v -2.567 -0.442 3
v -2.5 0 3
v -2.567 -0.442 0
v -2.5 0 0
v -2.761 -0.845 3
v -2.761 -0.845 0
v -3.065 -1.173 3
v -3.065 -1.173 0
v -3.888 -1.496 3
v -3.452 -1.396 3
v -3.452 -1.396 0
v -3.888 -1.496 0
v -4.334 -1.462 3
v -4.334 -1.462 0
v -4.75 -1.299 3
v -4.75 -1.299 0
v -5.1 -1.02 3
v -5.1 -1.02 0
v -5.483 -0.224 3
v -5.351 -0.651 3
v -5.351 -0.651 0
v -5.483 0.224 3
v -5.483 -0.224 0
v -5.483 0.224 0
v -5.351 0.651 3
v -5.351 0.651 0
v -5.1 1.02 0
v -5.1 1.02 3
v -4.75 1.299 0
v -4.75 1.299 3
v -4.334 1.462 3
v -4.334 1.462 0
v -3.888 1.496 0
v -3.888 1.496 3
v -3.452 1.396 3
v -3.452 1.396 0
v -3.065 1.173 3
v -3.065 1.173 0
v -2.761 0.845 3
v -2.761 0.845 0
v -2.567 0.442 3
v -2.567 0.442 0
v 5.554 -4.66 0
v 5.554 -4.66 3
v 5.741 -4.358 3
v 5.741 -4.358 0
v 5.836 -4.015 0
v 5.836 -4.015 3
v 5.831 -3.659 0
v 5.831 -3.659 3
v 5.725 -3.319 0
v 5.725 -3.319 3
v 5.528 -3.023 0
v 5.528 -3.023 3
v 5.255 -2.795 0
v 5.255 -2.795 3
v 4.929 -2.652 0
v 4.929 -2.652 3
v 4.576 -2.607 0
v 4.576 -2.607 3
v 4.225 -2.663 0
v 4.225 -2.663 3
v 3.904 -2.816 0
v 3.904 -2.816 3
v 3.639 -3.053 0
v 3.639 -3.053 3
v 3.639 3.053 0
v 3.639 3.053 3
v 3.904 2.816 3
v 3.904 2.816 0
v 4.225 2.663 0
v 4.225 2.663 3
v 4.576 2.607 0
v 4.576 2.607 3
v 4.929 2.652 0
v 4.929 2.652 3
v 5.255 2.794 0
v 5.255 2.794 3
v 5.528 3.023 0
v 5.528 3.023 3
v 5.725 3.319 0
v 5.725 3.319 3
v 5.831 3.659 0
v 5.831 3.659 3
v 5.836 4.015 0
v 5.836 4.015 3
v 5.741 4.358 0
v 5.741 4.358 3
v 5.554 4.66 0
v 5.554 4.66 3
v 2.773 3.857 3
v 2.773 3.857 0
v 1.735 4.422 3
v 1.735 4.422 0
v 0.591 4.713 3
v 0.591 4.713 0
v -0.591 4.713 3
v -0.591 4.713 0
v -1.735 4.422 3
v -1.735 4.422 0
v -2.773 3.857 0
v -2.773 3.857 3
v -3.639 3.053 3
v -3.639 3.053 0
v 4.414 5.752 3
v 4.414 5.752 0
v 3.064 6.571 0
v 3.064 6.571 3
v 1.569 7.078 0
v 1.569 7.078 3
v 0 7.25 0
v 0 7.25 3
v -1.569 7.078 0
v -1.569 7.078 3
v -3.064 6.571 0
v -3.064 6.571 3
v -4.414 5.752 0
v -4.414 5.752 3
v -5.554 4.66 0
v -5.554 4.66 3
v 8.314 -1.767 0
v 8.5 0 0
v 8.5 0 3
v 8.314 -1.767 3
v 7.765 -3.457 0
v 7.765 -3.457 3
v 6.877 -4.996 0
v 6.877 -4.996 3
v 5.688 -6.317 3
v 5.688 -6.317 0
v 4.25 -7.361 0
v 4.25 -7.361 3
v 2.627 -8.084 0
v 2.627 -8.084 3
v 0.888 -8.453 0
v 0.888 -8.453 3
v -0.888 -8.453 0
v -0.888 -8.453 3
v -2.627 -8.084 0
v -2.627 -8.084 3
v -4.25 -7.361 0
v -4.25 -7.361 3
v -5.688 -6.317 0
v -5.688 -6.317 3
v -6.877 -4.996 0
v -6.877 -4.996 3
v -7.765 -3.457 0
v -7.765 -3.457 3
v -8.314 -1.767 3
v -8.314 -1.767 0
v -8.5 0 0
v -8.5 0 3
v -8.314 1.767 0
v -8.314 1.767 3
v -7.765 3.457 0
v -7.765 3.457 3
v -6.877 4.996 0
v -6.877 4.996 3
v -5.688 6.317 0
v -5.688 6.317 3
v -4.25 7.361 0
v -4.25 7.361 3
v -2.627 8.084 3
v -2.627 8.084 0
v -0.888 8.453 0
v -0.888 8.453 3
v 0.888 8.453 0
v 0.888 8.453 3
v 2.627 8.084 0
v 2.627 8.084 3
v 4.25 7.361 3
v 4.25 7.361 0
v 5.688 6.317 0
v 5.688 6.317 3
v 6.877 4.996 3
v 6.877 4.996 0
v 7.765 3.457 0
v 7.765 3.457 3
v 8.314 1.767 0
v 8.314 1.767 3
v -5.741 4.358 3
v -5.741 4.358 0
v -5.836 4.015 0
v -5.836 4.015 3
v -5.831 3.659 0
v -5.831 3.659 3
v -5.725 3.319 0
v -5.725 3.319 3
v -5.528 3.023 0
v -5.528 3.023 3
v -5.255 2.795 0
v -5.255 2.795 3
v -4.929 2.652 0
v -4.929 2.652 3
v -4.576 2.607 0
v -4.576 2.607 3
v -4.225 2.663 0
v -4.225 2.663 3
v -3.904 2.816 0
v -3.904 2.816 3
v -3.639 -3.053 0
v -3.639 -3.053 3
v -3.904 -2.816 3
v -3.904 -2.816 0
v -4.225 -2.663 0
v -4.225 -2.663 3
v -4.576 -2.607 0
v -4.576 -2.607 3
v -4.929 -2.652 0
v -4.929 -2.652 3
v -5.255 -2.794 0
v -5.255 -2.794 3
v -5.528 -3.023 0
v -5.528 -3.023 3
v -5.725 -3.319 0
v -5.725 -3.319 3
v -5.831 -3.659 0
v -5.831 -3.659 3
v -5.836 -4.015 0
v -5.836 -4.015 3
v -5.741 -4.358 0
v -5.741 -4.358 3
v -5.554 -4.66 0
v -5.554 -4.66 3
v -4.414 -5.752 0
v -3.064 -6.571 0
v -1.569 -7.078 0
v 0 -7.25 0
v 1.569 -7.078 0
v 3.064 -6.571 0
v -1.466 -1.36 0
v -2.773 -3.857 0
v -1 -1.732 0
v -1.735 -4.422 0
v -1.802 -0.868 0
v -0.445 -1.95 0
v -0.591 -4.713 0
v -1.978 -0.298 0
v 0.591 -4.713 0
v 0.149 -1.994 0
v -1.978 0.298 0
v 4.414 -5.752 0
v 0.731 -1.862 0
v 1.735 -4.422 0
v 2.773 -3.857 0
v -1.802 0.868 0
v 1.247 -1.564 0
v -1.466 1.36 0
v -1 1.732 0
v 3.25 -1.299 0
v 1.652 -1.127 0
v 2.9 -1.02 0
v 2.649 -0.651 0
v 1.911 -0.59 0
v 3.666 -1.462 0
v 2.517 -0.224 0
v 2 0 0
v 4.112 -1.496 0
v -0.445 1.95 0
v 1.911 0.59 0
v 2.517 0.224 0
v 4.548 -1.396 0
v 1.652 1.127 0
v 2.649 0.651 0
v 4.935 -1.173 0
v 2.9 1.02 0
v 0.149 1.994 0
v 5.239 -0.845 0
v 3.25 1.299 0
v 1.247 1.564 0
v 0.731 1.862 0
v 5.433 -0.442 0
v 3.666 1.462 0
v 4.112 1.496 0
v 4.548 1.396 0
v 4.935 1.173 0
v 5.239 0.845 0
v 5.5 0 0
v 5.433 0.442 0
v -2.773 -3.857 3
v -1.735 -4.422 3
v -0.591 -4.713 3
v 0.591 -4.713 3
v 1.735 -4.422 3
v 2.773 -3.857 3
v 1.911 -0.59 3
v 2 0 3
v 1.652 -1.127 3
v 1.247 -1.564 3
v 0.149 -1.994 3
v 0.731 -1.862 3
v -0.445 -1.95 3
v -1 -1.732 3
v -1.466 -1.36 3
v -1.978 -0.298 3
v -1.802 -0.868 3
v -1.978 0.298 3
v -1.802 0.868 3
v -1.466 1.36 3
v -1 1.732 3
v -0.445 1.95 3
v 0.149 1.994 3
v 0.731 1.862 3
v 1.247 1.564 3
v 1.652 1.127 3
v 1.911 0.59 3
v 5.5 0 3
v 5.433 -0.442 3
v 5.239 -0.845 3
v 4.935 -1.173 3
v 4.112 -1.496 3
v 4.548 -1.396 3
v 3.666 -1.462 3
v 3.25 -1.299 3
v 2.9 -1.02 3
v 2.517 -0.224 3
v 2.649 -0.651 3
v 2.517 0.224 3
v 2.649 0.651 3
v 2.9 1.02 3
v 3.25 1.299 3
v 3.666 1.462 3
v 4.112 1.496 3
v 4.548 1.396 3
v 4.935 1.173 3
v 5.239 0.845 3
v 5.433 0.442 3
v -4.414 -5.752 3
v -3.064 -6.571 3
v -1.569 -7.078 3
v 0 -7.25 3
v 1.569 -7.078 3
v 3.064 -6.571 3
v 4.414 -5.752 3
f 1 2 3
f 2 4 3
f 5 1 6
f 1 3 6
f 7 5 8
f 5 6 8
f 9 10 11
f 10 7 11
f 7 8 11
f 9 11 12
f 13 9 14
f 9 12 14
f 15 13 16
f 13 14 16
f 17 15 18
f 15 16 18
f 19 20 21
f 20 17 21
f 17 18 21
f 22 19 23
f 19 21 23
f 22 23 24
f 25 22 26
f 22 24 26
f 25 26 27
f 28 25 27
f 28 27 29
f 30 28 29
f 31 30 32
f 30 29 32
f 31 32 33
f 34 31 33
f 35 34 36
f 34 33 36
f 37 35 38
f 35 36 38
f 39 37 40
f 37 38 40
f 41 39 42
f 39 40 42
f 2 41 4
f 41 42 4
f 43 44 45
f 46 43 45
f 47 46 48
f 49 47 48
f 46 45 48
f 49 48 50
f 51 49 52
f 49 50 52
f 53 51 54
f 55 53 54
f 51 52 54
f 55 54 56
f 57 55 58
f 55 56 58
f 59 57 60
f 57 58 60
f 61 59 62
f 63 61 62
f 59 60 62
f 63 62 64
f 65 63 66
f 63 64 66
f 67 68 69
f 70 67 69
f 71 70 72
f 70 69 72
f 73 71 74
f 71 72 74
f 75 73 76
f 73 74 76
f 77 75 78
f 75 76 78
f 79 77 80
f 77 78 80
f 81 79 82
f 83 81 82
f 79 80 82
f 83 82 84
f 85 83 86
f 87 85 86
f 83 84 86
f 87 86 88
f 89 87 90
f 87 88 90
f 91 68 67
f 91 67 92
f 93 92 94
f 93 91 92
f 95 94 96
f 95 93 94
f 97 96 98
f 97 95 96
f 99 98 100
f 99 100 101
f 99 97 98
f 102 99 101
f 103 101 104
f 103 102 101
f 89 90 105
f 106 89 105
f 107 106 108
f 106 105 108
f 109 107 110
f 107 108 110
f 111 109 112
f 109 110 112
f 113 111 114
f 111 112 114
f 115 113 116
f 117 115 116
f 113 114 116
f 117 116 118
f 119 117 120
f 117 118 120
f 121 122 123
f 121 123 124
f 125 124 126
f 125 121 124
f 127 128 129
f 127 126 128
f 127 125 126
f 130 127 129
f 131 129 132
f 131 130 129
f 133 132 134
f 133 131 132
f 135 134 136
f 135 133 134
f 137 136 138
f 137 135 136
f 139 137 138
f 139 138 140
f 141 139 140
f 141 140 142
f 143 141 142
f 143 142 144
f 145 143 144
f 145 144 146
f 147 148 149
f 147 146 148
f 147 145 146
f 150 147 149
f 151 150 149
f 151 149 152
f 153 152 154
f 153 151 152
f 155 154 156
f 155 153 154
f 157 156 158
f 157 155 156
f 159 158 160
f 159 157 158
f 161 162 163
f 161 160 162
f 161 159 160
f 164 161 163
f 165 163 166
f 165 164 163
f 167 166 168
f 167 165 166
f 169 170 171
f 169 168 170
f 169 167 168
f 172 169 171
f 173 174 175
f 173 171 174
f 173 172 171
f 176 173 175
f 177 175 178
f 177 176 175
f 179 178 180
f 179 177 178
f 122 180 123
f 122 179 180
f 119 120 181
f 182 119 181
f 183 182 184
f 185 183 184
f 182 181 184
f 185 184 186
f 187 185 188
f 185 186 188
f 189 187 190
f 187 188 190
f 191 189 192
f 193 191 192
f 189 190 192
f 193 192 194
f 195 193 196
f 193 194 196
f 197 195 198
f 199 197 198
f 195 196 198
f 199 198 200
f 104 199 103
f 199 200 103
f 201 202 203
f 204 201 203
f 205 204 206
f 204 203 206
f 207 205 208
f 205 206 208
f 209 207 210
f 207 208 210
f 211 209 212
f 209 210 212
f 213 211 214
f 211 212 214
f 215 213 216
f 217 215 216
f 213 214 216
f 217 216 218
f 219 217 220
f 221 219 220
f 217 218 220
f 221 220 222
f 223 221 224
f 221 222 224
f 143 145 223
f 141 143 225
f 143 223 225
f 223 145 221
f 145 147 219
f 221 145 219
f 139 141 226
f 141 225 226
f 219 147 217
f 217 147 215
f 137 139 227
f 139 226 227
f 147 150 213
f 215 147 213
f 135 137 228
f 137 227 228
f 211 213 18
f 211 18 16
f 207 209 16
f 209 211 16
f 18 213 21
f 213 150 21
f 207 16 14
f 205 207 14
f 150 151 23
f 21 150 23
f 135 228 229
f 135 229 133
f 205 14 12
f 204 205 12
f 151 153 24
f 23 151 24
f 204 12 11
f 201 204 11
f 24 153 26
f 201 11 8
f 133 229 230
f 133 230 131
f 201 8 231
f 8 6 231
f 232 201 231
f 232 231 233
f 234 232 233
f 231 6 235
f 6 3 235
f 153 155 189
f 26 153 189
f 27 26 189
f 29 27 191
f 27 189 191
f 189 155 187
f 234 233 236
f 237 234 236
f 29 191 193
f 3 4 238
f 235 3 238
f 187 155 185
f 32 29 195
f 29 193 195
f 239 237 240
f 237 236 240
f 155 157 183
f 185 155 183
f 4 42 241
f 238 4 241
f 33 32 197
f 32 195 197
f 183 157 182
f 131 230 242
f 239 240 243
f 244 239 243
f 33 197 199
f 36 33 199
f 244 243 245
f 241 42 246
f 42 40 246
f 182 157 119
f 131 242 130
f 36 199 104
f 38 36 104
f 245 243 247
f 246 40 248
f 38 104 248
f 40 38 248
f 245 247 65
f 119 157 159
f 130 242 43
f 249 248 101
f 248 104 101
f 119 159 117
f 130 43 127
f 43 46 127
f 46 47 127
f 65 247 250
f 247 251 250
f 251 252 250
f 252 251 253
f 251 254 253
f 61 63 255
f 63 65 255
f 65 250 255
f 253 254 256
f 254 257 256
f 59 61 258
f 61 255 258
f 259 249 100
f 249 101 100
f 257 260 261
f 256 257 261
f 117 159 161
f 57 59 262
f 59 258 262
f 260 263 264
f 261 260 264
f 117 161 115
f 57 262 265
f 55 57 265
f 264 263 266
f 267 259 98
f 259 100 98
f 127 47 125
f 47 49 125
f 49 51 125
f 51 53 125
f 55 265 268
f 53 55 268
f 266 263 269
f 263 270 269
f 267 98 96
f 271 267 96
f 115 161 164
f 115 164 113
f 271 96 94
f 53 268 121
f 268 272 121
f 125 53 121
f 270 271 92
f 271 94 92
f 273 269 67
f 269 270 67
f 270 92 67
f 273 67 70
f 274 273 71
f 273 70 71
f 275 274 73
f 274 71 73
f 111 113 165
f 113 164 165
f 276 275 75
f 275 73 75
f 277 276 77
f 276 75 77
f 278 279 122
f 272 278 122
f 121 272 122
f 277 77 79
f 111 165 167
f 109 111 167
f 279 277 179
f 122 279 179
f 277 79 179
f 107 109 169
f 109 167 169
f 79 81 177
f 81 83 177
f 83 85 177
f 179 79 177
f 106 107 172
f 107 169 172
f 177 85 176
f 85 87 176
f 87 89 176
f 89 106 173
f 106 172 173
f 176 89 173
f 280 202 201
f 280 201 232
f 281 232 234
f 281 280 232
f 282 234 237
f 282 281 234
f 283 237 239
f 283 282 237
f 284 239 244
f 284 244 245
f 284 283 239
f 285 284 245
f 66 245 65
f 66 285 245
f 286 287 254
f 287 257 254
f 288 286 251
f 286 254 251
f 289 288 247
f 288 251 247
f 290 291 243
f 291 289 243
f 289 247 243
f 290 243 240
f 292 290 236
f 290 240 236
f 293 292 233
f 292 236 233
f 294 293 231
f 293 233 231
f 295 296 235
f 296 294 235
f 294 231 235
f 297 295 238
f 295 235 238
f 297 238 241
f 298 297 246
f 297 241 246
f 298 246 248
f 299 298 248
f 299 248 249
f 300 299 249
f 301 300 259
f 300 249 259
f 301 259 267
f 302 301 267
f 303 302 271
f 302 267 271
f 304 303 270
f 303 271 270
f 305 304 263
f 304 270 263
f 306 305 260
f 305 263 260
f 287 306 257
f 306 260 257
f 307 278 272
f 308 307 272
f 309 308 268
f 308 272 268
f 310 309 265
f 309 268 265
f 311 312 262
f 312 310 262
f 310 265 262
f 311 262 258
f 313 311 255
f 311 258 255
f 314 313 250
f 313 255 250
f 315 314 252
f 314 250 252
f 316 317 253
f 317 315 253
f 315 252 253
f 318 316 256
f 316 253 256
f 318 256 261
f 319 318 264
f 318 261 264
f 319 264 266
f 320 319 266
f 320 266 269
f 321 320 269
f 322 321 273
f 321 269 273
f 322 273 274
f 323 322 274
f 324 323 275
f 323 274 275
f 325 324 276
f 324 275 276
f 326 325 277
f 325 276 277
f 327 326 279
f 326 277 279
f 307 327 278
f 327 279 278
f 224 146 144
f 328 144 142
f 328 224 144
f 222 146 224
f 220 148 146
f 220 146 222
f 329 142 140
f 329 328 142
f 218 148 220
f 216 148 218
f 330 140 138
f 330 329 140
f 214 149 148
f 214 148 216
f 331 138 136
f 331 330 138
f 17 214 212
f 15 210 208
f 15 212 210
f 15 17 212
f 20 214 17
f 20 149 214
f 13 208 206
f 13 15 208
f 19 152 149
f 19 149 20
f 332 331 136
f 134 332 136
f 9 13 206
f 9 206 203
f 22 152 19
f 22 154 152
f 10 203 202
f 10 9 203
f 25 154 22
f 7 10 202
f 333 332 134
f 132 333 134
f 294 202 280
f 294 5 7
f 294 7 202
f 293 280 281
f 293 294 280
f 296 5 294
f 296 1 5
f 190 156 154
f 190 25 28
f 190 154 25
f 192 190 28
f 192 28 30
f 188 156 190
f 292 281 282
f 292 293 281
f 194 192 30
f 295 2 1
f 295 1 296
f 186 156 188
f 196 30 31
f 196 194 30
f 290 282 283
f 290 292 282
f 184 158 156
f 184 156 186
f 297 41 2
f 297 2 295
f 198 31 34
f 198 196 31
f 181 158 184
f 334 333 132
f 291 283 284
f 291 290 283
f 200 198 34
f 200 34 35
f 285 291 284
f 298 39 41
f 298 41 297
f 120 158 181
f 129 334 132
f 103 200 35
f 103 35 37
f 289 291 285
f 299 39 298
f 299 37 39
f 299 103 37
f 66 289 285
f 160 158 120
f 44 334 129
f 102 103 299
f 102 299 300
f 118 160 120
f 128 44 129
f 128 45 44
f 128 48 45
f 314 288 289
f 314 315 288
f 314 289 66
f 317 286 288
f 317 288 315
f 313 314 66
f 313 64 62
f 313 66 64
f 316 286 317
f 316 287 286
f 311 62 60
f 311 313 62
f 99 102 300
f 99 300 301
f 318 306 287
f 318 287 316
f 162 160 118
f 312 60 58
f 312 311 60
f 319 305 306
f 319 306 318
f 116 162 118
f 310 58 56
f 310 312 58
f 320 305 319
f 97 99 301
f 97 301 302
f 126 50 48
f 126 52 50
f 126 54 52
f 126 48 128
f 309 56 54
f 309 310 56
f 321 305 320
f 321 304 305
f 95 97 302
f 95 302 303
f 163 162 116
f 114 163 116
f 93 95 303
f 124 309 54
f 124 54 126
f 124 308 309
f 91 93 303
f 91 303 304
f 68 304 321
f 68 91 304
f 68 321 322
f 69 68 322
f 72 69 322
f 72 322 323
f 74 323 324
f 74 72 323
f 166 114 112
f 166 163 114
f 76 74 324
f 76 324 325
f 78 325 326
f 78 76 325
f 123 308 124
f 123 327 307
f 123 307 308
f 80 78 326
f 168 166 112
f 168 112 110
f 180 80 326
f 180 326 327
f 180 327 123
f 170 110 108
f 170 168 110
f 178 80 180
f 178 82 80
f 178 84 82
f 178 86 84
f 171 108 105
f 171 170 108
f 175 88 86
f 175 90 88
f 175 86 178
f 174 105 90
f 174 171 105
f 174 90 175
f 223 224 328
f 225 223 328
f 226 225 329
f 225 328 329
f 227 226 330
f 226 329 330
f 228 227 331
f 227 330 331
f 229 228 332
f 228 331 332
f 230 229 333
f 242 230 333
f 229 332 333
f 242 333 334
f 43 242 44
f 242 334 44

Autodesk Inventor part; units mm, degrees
ref_plane "YZ Plane" through (0, 0, 0) normal (1, 0, 0) x (0, 1, 0)
ref_plane "XZ Plane" through (0, 0, 0) normal (0, 1, 0) x (-1, 0, 0)
ref_plane "XY Plane" through (0, 0, 0) normal (0, 0, 1) x (1, 0, 0)
sketch "スケッチ1" plane through (0, 0, 0) normal (0, 0, 1) x (1, 0, 0)
  line L0 (0, 0) -> (-4, 0) construction
  circle A0 centre (-4, 0) radius 1.5
  line L1 (0, 0) -> (4, 0) construction
  circle A1 centre (4, 0) radius 1.5
  line L2 (0, 0) -> (0, 4.3) construction
  line L3 (0, 0) -> (-8.8388, 8.8388) construction
  circle A2 centre (-8.8388, 8.8388) radius 1.5
  line L4 (0, 0) -> (-8.8388, -8.8388) construction
  circle A3 centre (-8.8388, -8.8388) radius 1.5
  line L5 (0, 0) -> (8.8388, -8.8388) construction
  circle A4 centre (8.8388, -8.8388) radius 1.5
  line L6 (0, 0) -> (8.8388, 8.8388) construction
  circle A5 centre (8.8388, 8.8388) radius 1.5
  circle A6 centre (0, 0) radius 8.5
  circle A7 centre (0, 0) radius 15.5
  circle A8 centre (0, 0) radius 2
  dimension "d0" = 4
  dimension "d1" = 3
  dimension "d4" = 360
  dimension "d6" = 12.5
  dimension "d7" = 3
  dimension "d8" = 45
  dimension "d11" = 360
  dimension "d14" = 17
  dimension "d15" = 1.5
  dimension "d16" = 4
extrude "押し出し1" add sketch "スケッチ1" along normal blind 3 contours A6
sketch "スケッチ4" plane through (0, 0, 3) normal (0, 0, 1) x (1, 0, 0)
  circle A0 centre (0, 0) radius 8.5 projected
  circle A1 centre (-4, 0) radius 1.5 projected
  circle A2 centre (4, 0) radius 1.5 projected
  circle A3 centre (0, 0) radius 2 projected
  line L0 (0, 0) -> (-4.5963, 3.8567)
  line L1 (0, 0) -> (6, 0) construction
  line L2 (0, 0) -> (4.5963, 3.8567)
  line L3 (0, 0) -> (6, 0) construction
  arc A4 (4.5963, 3.8567) -> (-4.5963, 3.8567) centre (0, 0) ccw construction
  arc A5 (5.5538, 4.6602) -> (-5.5538, 4.6602) centre (0, 0) ccw
  arc A6 (3.6387, 3.0532) -> (-3.6387, 3.0532) centre (0, 0) ccw
  arc A7 (3.6387, 3.0532) -> (5.5538, 4.6602) centre (4.5963, 3.8567) ccw
  arc A8 (-5.5538, 4.6602) -> (-3.6387, 3.0532) centre (-4.5963, 3.8567) ccw
  line L4 (-4, 0) -> (4, 0)
  arc A9 (-5.5538, -4.6602) -> (5.5538, -4.6602) centre (0, 0) ccw
  arc A10 (-3.6387, -3.0532) -> (3.6387, -3.0532) centre (0, 0) ccw
  arc A11 (5.5538, -4.6602) -> (3.6387, -3.0532) centre (4.5963, -3.8567) ccw
  arc A12 (-3.6387, -3.0532) -> (-5.5538, -4.6602) centre (-4.5963, -3.8567) ccw
  dimension "d29" = 6
  dimension "d30" = 140
  dimension "d31" = 6
  dimension "d32" = 40
  dimension "d33" = 2.5
extrude "押し出し4" cut sketch "スケッチ4" against normal blind 3 contours A8 A5 A7 A6 | A12 A10 A11 A9
properties part number "脚中間フレームカム2" material "アセタール樹脂、白"
